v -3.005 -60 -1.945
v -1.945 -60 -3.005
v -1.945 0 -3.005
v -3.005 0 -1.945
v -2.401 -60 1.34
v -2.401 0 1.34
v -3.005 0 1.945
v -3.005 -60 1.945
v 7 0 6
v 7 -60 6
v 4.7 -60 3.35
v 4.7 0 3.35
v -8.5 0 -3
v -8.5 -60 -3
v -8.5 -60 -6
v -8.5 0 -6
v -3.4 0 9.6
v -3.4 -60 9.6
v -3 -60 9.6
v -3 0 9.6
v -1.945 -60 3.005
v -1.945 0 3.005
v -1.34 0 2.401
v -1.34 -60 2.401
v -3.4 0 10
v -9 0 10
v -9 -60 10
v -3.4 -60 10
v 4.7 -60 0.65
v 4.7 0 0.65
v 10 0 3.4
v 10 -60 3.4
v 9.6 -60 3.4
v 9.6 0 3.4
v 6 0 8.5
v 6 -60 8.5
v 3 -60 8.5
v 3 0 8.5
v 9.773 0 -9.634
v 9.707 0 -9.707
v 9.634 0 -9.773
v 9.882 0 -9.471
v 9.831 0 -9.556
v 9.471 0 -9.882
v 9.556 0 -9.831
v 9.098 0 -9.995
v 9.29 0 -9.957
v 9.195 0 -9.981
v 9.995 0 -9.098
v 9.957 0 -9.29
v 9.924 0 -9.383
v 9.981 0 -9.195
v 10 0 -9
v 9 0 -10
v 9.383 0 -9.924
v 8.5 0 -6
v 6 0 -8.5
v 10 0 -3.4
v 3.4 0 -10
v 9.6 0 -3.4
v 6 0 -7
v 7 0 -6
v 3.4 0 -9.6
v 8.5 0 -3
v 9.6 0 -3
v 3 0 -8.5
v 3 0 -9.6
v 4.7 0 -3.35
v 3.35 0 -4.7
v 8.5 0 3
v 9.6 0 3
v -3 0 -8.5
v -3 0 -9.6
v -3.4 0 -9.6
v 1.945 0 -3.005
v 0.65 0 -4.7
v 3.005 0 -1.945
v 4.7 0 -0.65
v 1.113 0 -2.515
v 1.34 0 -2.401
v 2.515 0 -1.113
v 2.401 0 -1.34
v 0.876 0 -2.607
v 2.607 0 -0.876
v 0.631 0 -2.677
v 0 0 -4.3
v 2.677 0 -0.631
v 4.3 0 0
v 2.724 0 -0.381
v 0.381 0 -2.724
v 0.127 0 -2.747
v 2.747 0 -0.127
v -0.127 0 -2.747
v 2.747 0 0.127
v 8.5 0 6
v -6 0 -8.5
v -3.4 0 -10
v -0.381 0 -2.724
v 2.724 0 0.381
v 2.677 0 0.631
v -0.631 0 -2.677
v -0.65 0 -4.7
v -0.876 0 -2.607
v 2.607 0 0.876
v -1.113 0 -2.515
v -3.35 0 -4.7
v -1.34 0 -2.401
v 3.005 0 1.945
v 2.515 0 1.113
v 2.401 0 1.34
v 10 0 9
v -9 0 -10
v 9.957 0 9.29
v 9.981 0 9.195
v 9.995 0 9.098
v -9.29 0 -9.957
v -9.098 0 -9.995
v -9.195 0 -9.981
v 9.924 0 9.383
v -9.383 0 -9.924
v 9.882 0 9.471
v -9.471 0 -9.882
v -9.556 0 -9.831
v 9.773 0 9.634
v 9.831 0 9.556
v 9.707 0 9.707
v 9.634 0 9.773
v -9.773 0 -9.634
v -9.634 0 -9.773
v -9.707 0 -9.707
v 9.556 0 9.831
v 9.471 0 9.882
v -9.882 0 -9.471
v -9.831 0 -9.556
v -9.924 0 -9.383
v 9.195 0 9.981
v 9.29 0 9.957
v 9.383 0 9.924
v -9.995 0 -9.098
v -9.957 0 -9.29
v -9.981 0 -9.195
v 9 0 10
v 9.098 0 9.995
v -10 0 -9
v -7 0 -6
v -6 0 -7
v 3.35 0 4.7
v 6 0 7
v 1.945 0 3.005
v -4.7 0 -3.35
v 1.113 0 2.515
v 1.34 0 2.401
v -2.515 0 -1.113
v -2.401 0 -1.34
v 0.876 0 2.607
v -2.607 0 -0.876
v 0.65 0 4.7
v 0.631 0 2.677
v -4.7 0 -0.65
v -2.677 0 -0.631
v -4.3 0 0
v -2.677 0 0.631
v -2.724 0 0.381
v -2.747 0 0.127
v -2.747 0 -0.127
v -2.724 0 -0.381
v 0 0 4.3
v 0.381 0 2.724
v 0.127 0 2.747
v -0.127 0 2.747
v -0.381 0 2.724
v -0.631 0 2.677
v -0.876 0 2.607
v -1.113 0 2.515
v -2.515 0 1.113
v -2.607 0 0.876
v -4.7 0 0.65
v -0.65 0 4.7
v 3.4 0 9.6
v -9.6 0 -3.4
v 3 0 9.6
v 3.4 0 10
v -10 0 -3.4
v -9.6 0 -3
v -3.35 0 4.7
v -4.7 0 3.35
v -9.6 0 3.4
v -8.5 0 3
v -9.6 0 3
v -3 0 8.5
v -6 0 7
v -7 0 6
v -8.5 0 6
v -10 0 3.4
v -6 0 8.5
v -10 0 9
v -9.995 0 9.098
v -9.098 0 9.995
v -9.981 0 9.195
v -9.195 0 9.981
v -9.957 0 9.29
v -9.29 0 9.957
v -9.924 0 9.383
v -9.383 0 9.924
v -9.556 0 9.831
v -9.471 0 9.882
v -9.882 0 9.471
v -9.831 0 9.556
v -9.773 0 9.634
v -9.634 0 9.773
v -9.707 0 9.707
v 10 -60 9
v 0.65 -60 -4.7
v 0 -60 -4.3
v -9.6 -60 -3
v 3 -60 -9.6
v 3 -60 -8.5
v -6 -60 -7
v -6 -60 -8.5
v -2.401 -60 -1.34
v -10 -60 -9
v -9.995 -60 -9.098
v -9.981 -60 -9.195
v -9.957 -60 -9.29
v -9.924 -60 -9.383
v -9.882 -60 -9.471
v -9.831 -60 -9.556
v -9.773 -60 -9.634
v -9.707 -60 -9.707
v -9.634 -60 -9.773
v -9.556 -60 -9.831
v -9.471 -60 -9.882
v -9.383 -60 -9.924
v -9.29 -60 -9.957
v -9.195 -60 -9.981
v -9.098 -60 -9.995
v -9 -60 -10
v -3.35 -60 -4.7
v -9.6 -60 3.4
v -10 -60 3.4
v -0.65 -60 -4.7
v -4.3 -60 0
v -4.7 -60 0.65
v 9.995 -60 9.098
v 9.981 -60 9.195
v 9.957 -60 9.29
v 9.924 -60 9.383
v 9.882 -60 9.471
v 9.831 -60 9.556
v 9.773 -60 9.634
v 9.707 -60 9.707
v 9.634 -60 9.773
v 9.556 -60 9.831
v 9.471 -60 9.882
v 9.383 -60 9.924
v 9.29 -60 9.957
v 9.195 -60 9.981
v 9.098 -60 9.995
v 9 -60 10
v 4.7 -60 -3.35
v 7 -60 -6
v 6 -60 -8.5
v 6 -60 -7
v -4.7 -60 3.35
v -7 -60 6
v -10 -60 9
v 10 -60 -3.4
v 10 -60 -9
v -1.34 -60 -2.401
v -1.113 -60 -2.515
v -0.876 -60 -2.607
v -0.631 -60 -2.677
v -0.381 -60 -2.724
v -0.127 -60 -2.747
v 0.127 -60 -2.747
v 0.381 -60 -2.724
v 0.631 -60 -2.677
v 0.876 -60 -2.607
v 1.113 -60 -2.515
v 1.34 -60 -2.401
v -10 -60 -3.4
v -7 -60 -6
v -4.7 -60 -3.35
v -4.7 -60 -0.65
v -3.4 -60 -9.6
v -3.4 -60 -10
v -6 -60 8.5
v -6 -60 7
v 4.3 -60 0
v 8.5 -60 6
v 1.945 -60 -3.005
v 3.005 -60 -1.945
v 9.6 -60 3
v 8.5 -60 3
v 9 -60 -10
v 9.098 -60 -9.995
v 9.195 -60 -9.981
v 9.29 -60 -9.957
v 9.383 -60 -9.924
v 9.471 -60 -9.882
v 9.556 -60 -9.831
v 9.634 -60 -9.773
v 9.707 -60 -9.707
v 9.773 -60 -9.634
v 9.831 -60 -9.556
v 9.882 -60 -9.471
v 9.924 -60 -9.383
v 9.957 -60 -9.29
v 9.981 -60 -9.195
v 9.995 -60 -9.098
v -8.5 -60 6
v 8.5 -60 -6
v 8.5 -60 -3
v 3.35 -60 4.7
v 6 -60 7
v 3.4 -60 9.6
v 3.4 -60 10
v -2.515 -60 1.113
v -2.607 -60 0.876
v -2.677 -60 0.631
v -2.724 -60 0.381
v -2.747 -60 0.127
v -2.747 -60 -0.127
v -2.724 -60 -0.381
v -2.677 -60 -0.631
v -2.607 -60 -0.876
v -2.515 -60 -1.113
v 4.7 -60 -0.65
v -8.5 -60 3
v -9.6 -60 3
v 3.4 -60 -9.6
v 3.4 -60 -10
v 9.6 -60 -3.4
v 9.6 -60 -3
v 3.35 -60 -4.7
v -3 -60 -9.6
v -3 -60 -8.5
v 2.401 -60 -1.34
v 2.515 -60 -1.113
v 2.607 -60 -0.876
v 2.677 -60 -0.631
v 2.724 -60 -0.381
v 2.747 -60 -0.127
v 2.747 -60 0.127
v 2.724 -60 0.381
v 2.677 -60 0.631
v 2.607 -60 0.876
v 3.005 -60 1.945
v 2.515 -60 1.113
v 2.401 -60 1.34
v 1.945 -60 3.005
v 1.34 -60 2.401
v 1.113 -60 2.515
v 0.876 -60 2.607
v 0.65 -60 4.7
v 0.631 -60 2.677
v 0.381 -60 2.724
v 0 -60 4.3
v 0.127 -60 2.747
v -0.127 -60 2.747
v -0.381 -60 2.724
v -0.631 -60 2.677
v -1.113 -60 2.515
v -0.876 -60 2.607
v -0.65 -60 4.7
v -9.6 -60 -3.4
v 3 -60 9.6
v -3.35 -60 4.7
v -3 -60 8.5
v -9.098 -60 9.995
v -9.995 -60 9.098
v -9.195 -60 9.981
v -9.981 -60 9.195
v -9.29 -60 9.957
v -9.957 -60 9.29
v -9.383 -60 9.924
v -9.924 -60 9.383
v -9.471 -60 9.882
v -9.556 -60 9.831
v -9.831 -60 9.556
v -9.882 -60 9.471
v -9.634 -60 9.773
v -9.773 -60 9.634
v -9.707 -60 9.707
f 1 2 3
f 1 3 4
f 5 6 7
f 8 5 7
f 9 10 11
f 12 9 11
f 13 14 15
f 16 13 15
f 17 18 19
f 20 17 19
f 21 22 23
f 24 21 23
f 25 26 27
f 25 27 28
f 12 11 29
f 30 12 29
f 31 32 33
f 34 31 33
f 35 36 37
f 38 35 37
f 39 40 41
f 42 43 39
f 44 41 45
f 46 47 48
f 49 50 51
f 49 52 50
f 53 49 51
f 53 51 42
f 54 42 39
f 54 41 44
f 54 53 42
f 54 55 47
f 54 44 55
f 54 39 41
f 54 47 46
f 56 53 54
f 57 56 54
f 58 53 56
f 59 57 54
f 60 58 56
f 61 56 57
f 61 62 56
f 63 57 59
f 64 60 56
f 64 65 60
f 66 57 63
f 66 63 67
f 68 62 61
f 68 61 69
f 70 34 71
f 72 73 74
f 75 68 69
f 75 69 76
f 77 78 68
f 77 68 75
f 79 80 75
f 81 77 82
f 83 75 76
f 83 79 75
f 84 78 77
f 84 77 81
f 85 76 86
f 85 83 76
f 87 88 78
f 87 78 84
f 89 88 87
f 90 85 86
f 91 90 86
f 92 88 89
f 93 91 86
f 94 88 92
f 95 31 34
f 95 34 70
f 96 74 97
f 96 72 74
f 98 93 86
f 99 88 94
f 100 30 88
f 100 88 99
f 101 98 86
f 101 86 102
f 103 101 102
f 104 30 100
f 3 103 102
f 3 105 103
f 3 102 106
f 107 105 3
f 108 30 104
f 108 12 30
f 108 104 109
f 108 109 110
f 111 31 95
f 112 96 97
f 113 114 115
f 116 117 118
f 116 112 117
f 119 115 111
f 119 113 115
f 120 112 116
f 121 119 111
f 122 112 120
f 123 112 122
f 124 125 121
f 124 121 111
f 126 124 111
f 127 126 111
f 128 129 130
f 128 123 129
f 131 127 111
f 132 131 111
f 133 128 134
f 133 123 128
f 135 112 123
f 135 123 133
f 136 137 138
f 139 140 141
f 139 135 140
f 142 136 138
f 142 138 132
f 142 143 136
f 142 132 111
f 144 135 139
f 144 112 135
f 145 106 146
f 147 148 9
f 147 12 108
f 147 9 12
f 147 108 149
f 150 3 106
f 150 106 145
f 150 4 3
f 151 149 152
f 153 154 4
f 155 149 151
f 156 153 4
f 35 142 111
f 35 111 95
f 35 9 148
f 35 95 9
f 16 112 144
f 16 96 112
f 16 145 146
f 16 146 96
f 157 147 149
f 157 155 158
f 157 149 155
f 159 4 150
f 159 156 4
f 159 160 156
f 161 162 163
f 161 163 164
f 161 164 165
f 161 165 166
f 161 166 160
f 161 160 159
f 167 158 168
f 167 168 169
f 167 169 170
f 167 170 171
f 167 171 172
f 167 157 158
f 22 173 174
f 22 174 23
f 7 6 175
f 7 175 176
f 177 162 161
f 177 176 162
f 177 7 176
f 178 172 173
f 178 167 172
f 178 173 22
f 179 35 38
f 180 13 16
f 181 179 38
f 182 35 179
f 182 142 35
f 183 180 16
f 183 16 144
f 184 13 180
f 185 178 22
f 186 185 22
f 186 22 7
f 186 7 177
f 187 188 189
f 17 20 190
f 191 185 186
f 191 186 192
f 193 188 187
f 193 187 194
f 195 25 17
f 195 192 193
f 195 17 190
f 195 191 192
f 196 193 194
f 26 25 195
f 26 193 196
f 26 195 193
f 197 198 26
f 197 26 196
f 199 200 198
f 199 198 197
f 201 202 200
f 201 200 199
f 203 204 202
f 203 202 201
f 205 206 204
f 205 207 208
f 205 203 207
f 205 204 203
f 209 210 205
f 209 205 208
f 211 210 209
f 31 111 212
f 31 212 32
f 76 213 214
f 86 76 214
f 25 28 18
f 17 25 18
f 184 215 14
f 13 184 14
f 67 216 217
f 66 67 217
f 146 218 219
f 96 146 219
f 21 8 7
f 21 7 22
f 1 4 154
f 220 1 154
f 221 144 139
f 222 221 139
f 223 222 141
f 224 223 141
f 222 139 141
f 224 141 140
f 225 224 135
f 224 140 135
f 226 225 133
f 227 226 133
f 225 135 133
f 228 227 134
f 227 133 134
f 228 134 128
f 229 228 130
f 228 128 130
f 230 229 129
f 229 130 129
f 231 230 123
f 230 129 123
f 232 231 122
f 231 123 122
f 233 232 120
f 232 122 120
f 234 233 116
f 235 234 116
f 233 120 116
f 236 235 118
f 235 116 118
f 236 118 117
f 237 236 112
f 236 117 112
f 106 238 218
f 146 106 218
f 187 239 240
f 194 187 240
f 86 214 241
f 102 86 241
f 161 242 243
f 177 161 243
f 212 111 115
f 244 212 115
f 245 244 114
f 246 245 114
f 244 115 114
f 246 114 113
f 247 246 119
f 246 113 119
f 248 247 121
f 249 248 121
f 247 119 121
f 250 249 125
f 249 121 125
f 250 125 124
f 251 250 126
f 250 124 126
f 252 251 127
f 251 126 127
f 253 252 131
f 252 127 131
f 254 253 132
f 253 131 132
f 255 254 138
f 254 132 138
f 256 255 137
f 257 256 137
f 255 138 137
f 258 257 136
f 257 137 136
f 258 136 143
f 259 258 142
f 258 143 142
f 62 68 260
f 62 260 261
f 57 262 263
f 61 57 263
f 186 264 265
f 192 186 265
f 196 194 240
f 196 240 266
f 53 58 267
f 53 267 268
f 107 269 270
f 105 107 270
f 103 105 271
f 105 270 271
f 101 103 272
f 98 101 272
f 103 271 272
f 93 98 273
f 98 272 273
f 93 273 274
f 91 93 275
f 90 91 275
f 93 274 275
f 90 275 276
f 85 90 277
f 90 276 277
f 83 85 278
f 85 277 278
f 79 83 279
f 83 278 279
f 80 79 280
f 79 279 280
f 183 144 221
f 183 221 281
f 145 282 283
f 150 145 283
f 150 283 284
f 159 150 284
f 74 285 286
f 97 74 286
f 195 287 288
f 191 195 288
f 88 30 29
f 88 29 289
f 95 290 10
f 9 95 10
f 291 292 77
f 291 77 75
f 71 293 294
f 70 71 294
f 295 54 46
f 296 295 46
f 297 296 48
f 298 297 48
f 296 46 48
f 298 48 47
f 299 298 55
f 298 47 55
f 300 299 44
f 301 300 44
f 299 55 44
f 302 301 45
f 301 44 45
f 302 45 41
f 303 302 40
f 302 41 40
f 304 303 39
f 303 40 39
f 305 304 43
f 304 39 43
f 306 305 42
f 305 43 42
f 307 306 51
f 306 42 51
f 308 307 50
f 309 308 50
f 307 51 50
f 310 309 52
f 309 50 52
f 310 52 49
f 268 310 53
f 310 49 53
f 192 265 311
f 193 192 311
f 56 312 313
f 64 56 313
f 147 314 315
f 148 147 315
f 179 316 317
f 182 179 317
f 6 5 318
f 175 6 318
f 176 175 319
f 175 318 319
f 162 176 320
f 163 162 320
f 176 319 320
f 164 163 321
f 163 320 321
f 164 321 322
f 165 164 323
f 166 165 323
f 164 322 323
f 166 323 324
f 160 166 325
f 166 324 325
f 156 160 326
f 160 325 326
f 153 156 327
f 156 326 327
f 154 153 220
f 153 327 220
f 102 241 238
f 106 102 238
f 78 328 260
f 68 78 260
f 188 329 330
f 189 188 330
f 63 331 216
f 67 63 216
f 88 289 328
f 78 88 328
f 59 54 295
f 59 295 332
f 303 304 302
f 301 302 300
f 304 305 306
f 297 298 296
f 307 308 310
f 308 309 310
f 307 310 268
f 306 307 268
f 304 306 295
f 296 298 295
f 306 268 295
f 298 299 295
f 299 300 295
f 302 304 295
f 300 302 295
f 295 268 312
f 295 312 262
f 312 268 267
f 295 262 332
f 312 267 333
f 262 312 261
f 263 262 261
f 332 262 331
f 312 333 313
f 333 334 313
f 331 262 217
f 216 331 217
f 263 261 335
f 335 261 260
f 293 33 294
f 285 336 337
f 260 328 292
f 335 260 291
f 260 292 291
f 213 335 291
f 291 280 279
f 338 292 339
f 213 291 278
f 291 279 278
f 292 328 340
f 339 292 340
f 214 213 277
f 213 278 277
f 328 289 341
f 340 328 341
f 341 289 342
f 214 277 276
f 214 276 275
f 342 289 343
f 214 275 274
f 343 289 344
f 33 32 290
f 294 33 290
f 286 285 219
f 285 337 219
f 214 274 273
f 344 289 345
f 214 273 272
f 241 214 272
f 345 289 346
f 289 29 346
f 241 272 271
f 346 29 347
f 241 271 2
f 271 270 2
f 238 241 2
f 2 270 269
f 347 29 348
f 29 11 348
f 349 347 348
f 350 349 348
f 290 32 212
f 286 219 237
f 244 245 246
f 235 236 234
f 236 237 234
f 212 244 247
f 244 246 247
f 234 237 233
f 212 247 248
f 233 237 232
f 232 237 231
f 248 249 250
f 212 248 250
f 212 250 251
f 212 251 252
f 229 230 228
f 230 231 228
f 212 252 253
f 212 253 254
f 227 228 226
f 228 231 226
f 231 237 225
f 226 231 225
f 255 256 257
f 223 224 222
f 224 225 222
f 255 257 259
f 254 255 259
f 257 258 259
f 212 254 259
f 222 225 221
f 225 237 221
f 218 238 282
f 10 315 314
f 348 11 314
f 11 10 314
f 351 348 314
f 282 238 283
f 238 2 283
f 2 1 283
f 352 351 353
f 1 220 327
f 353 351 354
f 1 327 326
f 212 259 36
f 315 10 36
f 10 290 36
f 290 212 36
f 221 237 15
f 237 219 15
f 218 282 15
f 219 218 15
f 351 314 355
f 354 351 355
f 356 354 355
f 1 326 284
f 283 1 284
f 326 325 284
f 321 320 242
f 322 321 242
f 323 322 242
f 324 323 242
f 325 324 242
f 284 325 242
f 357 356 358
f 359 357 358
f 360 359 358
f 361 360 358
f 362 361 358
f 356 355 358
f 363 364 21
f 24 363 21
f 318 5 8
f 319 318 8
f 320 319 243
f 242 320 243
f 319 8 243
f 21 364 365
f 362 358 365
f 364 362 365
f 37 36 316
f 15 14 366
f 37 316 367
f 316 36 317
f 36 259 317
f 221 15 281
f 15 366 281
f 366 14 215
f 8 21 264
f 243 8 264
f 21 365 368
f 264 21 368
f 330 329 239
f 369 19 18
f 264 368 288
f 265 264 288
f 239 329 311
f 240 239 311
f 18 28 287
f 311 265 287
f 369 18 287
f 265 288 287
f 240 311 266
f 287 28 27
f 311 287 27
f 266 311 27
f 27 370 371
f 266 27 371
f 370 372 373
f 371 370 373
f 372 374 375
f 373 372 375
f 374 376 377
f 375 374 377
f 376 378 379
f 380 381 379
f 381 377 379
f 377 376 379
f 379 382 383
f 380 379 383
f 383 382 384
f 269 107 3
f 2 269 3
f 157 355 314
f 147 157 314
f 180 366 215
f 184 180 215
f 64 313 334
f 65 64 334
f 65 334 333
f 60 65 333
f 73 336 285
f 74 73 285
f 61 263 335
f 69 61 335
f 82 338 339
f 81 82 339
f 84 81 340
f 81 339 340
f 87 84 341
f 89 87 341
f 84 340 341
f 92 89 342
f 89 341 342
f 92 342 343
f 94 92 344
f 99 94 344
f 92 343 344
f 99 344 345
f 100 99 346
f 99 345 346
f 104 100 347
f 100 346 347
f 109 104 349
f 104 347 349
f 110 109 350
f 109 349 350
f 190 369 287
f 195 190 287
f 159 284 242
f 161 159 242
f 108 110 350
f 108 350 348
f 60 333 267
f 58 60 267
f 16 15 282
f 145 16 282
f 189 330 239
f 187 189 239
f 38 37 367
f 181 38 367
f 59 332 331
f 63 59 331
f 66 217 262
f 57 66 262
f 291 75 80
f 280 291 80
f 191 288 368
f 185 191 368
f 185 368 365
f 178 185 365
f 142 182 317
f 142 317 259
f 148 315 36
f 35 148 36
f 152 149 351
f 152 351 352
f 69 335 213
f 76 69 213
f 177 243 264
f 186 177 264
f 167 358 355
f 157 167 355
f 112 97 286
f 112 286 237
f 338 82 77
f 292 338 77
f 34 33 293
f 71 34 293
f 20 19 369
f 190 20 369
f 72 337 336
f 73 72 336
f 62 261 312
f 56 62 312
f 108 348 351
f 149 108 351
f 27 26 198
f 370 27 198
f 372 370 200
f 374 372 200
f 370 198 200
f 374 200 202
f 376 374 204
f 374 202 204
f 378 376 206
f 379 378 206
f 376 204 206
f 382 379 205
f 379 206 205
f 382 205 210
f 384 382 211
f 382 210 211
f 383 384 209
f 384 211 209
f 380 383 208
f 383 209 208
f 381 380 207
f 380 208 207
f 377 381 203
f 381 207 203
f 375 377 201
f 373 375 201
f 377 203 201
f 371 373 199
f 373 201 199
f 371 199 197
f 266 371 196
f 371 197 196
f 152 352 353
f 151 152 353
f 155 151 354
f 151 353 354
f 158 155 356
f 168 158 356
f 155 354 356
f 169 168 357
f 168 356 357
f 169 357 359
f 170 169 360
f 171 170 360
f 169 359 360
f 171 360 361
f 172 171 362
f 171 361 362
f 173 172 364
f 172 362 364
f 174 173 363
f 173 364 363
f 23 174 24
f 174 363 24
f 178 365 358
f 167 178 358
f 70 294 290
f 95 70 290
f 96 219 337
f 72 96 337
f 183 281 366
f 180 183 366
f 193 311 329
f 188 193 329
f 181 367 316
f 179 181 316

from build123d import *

# Parameters (mm, degrees)
PAD_DEPTH          = 60
POCKET_DEPTH       = 380
POLARPATTERN_COUNT = 4
POCKET001_DEPTH    = 380


with BuildPart() as part:
    # Sketch → Pad (new body)
    with BuildSketch(Plane.XZ):
        with BuildLine():
            Line((-9, 10), (9, 10))
            ThreePointArc((10, 9), (9.707107, 9.707107), (9, 10))
            Line((10, 9), (10, -9))
            ThreePointArc((9, -10), (9.707107, -9.707107), (10, -9))
            Line((9, -10), (-9, -10))
            ThreePointArc((-10, -9), (-9.707107, -9.707107), (-9, -10))
            Line((-10, -9), (-10, 9))
            ThreePointArc((-9, 10), (-9.707107, 9.707107), (-10, 9))
        make_face()
    extrude(amount=PAD_DEPTH)

    # Sketch001 (on Face10 of Pad) → Pocket (cut)
    with BuildSketch(Plane.XZ.offset(60)):
        Polygon((-3.4, 10), (-3.4, 9.6), (-3, 9.6), (-3, 8.5), (-6, 8.5), (-6, 7), (-3.35, 4.7), (-0.65, 4.7), (0, 4.3), (0.65, 4.7), (3.35, 4.7), (6, 7), (6, 8.5), (3, 8.5), (3, 9.6), (3.4, 9.6), (3.4, 10), align=None)
    pocket = extrude(amount=-POCKET_DEPTH, mode=Mode.SUBTRACT)

    # PolarPattern: Pocket ×4 about axis
    polarpattern_axis = Axis((0, -60, 0), (0, -1, 0))
    for i in range(1, POLARPATTERN_COUNT):
        add(pocket.rotate(polarpattern_axis, i * 360 / POLARPATTERN_COUNT), mode=Mode.SUBTRACT)

    # Sketch002 (on Face4 of PolarPattern) → Pocket001 (cut)
    with BuildSketch(Plane.XZ.offset(60)):
        with BuildLine():
            ThreePointArc((1.340499, 2.401159), (0, 2.75), (-1.340499, 2.401159))
            Line((-1.944544, 3.005204), (-1.340499, 2.401159))
            Line((-3.005204, 1.944544), (-1.944544, 3.005204))
            Line((-2.401159, 1.340499), (-3.005204, 1.944544))
            ThreePointArc((-2.401159, 1.340499), (-2.75, 0), (-2.401159, -1.340499))
            Line((-3.005204, -1.944544), (-2.401159, -1.340499))
            Line((-1.944544, -3.005204), (-3.005204, -1.944544))
            Line((-1.340499, -2.401159), (-1.944544, -3.005204))
            ThreePointArc((-1.340499, -2.401159), (0, -2.75), (1.340499, -2.401159))
            Line((1.944544, -3.005204), (1.340499, -2.401159))
            Line((3.005204, -1.944544), (1.944544, -3.005204))
            Line((2.401159, -1.340499), (3.005204, -1.944544))
            ThreePointArc((2.401159, -1.340499), (2.75, 0), (2.401159, 1.340499))
            Line((2.401159, 1.340499), (3.005204, 1.944544))
            Line((3.005204, 1.944544), (1.944544, 3.005204))
            Line((1.944544, 3.005204), (1.340499, 2.401159))
        make_face()
    extrude(amount=-POCKET001_DEPTH, mode=Mode.SUBTRACT)


solid = part.part
